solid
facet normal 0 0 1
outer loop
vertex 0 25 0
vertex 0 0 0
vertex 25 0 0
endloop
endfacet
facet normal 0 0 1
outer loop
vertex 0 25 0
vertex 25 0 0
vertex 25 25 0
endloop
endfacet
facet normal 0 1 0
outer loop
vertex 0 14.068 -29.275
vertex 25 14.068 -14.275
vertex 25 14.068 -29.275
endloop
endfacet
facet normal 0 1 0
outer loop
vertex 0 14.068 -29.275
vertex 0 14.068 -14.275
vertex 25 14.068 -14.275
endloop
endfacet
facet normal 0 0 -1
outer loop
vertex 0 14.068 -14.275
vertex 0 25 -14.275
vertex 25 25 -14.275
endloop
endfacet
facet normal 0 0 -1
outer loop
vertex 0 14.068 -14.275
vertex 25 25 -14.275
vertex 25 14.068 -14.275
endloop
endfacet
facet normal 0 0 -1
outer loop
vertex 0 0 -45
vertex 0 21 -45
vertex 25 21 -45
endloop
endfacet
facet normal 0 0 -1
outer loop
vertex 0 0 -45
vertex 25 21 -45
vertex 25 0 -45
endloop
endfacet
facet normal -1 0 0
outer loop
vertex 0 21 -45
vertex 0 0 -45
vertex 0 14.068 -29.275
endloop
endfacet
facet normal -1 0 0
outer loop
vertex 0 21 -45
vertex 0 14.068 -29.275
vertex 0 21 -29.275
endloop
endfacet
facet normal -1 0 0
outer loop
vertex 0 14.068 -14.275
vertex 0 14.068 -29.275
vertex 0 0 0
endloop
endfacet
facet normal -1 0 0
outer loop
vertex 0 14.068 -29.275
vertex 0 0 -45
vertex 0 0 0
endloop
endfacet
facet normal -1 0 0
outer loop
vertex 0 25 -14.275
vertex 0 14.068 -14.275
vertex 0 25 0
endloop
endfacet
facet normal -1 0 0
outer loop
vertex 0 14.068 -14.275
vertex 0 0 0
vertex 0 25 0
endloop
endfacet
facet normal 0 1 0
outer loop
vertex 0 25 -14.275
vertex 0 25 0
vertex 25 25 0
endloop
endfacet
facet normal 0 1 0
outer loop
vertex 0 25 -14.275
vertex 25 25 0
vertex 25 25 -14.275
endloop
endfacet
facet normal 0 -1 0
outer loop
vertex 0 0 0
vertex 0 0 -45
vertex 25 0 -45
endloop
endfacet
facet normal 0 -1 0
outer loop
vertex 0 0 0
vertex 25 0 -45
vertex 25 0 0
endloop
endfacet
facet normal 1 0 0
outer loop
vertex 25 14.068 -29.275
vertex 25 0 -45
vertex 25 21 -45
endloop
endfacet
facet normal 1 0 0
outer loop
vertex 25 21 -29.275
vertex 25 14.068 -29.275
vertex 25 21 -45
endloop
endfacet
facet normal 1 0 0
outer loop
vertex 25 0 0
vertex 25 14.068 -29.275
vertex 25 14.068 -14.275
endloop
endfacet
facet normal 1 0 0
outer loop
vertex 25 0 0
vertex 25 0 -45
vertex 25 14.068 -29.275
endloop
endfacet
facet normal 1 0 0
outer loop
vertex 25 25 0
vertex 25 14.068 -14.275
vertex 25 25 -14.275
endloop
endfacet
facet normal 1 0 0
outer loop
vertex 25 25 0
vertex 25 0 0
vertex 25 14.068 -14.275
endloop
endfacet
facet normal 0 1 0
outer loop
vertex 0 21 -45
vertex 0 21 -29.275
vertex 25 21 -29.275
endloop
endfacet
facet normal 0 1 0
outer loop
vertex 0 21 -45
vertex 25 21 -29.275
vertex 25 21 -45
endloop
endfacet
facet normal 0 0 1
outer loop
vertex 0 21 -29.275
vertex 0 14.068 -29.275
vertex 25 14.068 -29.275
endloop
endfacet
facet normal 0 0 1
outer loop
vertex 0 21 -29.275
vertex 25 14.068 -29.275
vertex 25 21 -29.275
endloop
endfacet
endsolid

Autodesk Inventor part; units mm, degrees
ref_plane "YZ Plane" through (0, 0, 0) normal (1, 0, 0) x (0, 1, 0)
ref_plane "XZ Plane" through (0, 0, 0) normal (0, 1, 0) x (-1, 0, 0)
ref_plane "XY Plane" through (0, 0, 0) normal (0, 0, 1) x (1, 0, 0)
sketch "Esboço1" plane through (0, 0, 0) normal (1, 0, 0) x (0, 1, 0)
  line L0 (0, 0) -> (25, 0)
  line L1 (25, 0) -> (25, -45)
  line L2 (25, -45) -> (0, -45)
  line L3 (0, -45) -> (0, 0)
  dimension "d0" = 45
  dimension "d1" = 25
extrude "Extrusão1" add sketch "Esboço1" along normal blind 25
sketch "Esboço4" plane through (0, 0, 0) normal (-1, 0, 0) x (0, 0, 1)
  line L0 (-29.275, 25) -> (-14.275, 25)
  line L1 (-14.275, 25) -> (-14.275, 14.0681)
  line L2 (-14.275, 14.0681) -> (-29.275, 14.0681)
  line L3 (-29.275, 14.0681) -> (-29.275, 25)
  line L4 (0, 0) -> (-45, 0) projected
  dimension "d8" = 25
  dimension "d9" = 15
extrude "Extrusão3" cut sketch "Esboço4" against normal through all
sketch "Esboço6" plane through (0, 0, 0) normal (-1, 0, 0) x (0, 0, 1)
  line L0 (-45, 25) -> (-29.275, 25) projected
  line L1 (-29.275, 14.0681) -> (-29.275, 25) projected
  line L2 (-45, 25) -> (-29.275, 25)
  line L3 (-29.275, 25) -> (-29.275, 21)
  line L4 (-29.275, 21) -> (-45, 21)
  line L5 (-45, 21) -> (-45, 25)
  point P0 (0, 0)
  point P1 (-37.1375, 21)
  dimension "d12" = 4
  dimension "d13" = 15.725
extrude "Extrusão4" cut sketch "Esboço6" against normal through all
properties part number "Peça2_aula"
